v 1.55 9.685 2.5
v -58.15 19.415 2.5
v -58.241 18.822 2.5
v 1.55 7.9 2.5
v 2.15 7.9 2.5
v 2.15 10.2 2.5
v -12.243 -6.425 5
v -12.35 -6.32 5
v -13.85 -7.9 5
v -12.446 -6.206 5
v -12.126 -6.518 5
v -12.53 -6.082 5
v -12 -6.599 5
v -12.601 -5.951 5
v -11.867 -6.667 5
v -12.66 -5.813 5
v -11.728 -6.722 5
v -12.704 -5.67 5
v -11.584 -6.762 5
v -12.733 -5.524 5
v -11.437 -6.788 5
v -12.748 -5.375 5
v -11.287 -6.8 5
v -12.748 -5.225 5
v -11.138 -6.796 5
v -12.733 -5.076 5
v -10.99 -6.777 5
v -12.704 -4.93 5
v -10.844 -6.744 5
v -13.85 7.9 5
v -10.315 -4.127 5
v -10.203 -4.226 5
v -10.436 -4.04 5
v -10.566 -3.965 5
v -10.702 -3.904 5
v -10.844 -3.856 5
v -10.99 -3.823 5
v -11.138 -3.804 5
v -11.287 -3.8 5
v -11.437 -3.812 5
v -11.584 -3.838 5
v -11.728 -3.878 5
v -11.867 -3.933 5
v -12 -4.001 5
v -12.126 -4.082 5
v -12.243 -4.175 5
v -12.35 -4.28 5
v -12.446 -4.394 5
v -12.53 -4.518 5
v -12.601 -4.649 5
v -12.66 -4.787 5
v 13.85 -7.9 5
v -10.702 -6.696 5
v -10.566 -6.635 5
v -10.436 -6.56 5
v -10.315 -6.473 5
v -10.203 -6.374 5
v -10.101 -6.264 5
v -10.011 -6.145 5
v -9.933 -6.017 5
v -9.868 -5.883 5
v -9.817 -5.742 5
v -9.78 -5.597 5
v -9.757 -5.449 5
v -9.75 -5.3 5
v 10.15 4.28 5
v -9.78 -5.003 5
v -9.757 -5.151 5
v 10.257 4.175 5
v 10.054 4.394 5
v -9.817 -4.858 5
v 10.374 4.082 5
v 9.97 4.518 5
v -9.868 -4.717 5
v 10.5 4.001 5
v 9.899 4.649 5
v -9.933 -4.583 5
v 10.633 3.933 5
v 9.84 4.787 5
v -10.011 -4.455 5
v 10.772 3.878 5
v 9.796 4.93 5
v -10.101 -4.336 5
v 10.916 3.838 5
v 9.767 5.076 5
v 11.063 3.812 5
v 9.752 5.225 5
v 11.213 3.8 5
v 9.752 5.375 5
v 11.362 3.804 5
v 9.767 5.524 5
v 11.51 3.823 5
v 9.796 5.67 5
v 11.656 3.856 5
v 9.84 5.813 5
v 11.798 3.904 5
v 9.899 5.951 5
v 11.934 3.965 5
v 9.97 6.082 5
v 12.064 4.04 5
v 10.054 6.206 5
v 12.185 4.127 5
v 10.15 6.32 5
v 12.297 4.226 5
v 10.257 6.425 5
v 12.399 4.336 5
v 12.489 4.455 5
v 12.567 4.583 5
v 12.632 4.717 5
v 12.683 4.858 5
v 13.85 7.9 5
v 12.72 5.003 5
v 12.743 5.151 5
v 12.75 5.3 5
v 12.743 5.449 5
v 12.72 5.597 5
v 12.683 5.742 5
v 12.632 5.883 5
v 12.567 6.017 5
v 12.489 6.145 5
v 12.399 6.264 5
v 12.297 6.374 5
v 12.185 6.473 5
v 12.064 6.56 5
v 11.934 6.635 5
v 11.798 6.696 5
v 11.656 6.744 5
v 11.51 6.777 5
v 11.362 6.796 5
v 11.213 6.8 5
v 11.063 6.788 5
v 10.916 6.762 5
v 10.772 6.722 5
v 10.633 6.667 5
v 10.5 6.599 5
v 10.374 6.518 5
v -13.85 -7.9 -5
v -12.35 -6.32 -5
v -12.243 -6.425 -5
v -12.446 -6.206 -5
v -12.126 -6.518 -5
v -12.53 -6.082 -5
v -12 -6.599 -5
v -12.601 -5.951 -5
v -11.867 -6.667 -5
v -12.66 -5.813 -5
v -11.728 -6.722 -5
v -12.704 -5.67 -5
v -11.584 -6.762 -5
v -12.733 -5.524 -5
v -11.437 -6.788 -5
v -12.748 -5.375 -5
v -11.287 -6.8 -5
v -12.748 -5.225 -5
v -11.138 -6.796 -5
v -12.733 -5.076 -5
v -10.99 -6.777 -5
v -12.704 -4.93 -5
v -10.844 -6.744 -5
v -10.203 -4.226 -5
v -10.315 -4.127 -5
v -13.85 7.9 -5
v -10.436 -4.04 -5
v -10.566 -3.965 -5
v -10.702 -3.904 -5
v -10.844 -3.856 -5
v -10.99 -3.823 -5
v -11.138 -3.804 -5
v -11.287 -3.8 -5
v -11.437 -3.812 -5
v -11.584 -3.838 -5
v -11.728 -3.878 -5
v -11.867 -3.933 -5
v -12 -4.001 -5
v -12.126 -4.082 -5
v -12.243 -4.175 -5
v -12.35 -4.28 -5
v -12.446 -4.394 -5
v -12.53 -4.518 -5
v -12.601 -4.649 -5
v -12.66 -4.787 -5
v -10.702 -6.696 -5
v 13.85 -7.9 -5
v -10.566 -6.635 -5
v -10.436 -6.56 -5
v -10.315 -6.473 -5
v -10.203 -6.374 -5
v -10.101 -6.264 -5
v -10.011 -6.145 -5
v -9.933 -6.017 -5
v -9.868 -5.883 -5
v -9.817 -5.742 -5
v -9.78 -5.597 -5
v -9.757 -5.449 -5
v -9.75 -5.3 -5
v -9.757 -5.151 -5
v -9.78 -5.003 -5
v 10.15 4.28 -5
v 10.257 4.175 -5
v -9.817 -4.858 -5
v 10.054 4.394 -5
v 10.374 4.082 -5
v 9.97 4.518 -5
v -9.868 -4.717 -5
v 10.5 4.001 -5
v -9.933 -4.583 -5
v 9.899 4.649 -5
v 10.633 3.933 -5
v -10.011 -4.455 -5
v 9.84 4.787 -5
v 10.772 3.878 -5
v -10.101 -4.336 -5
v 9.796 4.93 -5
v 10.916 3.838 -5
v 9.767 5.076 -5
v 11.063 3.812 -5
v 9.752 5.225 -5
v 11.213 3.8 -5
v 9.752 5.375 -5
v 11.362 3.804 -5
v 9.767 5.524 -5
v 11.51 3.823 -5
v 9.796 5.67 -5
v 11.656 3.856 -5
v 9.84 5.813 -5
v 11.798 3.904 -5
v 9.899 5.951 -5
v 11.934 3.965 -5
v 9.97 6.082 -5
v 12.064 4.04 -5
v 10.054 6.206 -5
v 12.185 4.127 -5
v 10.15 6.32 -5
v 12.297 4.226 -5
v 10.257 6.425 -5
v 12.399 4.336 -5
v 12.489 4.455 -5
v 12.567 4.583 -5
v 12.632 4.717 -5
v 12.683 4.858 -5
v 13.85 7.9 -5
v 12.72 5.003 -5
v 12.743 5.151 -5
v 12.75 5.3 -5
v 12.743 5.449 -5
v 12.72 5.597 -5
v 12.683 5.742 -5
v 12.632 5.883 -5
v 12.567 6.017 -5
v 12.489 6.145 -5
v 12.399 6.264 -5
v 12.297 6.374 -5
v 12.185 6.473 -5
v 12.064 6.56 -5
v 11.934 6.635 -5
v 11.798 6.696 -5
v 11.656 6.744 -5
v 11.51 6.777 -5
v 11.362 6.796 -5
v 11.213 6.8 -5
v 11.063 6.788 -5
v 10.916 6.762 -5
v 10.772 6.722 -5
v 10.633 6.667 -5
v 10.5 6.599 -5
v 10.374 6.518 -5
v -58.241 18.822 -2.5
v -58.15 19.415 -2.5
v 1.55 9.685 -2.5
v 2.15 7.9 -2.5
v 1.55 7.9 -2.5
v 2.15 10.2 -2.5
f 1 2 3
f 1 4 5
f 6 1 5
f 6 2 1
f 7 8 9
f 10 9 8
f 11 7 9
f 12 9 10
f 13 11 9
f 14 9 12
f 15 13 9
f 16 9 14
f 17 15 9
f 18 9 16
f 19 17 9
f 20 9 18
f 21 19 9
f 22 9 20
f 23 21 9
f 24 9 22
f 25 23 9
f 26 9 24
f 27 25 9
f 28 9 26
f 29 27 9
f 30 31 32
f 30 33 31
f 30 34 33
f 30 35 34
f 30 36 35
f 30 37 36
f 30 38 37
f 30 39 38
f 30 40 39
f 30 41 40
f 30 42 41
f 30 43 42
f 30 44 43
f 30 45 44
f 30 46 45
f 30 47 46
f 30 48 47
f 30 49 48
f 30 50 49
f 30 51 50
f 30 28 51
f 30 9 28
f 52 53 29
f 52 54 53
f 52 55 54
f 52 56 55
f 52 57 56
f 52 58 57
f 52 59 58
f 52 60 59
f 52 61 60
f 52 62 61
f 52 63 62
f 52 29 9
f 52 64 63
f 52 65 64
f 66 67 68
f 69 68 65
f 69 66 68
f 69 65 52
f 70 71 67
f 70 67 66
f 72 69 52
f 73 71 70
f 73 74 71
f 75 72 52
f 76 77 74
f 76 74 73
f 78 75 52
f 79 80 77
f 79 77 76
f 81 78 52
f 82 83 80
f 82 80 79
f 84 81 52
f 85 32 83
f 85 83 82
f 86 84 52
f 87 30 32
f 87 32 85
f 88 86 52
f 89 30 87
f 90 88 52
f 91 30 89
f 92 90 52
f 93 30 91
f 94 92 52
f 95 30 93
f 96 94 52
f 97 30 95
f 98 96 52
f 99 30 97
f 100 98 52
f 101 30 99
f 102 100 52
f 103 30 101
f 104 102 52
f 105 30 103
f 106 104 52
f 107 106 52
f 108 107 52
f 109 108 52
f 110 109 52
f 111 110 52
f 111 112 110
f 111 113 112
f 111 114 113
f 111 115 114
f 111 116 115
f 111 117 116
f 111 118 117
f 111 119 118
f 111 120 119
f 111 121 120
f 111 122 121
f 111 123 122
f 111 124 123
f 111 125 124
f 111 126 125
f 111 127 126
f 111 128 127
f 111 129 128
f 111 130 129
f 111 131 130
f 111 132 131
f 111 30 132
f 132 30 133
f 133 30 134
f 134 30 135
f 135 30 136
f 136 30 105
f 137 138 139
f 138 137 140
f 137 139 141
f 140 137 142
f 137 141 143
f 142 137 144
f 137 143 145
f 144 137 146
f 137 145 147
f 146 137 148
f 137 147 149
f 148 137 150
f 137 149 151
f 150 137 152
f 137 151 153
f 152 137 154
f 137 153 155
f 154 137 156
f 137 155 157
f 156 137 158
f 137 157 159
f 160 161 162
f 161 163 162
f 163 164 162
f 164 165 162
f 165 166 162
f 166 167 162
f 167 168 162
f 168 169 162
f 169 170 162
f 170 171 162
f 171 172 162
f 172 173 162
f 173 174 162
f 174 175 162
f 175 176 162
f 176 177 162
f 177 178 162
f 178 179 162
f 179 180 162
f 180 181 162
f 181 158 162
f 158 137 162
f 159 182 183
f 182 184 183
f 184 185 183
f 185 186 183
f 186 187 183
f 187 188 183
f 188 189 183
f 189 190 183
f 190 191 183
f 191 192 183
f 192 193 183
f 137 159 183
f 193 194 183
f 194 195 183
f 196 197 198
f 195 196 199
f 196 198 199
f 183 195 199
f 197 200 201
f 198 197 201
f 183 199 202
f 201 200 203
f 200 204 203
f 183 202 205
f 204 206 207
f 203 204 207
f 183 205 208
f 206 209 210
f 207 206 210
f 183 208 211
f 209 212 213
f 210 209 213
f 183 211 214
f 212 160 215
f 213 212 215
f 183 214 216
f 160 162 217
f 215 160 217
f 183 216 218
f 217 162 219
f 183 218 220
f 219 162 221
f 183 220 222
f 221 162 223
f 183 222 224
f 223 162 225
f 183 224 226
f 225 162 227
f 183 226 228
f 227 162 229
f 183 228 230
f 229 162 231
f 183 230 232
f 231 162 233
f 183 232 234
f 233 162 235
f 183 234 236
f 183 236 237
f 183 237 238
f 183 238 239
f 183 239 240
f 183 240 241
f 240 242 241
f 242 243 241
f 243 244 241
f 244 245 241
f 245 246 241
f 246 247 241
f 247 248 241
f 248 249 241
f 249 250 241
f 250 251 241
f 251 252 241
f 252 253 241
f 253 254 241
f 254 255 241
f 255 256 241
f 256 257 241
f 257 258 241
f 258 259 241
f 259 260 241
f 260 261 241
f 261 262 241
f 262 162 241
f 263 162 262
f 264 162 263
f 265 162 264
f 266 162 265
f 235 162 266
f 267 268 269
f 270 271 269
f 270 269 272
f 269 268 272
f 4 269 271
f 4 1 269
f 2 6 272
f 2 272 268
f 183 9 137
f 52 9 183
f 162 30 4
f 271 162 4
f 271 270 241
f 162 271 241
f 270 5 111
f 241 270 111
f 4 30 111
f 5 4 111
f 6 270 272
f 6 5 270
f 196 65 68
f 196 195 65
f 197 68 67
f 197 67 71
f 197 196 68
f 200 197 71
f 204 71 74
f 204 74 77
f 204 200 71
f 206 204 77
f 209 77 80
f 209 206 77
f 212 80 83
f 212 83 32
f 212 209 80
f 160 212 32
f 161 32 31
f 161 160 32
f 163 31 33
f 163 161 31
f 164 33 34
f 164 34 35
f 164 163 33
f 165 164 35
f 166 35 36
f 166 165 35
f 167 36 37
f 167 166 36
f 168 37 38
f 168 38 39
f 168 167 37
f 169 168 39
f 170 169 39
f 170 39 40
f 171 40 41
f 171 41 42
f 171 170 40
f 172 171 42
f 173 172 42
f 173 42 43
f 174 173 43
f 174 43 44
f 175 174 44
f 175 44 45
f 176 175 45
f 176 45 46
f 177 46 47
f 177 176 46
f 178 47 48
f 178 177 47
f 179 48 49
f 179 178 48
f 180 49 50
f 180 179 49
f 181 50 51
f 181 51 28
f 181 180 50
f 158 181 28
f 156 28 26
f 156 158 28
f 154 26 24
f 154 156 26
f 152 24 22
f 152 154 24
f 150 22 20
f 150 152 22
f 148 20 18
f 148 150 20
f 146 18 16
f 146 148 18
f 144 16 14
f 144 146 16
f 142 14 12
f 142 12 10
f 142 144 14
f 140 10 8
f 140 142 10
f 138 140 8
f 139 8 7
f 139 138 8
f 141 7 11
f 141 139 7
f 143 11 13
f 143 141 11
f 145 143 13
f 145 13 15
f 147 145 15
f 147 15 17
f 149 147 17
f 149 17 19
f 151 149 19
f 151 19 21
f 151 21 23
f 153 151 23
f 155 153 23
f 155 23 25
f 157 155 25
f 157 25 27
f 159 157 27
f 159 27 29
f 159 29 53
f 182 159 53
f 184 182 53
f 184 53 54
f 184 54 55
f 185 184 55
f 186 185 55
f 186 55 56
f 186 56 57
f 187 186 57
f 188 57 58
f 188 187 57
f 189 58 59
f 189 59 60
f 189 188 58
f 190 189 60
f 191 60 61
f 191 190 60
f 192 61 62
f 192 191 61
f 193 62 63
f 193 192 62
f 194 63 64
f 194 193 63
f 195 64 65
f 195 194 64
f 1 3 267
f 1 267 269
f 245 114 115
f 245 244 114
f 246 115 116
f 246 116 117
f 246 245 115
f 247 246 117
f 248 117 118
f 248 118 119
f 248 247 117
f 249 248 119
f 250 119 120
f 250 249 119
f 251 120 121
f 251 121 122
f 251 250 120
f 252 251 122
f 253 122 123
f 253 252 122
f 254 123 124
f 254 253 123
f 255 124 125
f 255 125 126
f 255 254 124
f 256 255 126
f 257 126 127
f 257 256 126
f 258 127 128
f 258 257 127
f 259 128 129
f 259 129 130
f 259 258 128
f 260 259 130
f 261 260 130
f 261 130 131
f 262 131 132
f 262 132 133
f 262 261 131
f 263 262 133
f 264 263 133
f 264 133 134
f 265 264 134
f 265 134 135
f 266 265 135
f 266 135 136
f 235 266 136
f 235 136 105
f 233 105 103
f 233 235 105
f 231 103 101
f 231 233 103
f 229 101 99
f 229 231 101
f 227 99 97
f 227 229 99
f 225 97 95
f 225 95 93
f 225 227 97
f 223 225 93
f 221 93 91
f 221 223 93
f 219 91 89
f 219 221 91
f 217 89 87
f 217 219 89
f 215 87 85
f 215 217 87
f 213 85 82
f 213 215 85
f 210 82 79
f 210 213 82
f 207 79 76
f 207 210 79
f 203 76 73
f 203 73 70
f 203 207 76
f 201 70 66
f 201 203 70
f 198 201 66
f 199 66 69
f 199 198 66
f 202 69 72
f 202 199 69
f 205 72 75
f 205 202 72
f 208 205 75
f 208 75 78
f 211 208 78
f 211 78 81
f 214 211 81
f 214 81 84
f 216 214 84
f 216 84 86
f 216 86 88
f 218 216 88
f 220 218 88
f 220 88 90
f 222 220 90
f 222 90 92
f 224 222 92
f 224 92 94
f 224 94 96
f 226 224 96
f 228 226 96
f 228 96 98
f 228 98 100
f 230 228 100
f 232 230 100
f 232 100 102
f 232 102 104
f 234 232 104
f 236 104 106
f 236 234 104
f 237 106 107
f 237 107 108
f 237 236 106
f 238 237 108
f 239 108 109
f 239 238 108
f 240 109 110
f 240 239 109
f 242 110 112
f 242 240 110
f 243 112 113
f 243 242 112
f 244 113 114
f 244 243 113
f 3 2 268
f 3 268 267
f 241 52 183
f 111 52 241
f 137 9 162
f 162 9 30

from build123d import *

# Parameters (mm, degrees)
SKETCH_1_W        = 27.7
SKETCH_1_H        = 15.8
SKETCH_1_R        = 1.5
EXTRUDE_1_DEPTH   = 5
EXTRUDE_1_2_DEPTH = 2.5


with BuildPart() as part:
    # ｽｹｯﾁ1 → Extrude 1 (new, symmetric)
    with BuildSketch(Plane.XY):
        Rectangle(SKETCH_1_W, SKETCH_1_H)
        with Locations((11.25, 5.3)):
            Circle(SKETCH_1_R, mode=Mode.SUBTRACT)
        with Locations((-11.25, -5.3)):
            Circle(SKETCH_1_R, mode=Mode.SUBTRACT)
    extrude(amount=EXTRUDE_1_DEPTH, both=True)

    # ｽｹｯﾁ2 → Extrude 1 2 (add, symmetric)
    with BuildSketch(Plane.XY):
        Polygon((2.15, 7.9), (2.15, 10.2), (-58.15, 19.414662229), (-58.240636022, 18.821547475), (1.55, 9.684723007), (1.55, 7.9), align=None)
    extrude(amount=EXTRUDE_1_2_DEPTH, both=True)


solid = part.part
